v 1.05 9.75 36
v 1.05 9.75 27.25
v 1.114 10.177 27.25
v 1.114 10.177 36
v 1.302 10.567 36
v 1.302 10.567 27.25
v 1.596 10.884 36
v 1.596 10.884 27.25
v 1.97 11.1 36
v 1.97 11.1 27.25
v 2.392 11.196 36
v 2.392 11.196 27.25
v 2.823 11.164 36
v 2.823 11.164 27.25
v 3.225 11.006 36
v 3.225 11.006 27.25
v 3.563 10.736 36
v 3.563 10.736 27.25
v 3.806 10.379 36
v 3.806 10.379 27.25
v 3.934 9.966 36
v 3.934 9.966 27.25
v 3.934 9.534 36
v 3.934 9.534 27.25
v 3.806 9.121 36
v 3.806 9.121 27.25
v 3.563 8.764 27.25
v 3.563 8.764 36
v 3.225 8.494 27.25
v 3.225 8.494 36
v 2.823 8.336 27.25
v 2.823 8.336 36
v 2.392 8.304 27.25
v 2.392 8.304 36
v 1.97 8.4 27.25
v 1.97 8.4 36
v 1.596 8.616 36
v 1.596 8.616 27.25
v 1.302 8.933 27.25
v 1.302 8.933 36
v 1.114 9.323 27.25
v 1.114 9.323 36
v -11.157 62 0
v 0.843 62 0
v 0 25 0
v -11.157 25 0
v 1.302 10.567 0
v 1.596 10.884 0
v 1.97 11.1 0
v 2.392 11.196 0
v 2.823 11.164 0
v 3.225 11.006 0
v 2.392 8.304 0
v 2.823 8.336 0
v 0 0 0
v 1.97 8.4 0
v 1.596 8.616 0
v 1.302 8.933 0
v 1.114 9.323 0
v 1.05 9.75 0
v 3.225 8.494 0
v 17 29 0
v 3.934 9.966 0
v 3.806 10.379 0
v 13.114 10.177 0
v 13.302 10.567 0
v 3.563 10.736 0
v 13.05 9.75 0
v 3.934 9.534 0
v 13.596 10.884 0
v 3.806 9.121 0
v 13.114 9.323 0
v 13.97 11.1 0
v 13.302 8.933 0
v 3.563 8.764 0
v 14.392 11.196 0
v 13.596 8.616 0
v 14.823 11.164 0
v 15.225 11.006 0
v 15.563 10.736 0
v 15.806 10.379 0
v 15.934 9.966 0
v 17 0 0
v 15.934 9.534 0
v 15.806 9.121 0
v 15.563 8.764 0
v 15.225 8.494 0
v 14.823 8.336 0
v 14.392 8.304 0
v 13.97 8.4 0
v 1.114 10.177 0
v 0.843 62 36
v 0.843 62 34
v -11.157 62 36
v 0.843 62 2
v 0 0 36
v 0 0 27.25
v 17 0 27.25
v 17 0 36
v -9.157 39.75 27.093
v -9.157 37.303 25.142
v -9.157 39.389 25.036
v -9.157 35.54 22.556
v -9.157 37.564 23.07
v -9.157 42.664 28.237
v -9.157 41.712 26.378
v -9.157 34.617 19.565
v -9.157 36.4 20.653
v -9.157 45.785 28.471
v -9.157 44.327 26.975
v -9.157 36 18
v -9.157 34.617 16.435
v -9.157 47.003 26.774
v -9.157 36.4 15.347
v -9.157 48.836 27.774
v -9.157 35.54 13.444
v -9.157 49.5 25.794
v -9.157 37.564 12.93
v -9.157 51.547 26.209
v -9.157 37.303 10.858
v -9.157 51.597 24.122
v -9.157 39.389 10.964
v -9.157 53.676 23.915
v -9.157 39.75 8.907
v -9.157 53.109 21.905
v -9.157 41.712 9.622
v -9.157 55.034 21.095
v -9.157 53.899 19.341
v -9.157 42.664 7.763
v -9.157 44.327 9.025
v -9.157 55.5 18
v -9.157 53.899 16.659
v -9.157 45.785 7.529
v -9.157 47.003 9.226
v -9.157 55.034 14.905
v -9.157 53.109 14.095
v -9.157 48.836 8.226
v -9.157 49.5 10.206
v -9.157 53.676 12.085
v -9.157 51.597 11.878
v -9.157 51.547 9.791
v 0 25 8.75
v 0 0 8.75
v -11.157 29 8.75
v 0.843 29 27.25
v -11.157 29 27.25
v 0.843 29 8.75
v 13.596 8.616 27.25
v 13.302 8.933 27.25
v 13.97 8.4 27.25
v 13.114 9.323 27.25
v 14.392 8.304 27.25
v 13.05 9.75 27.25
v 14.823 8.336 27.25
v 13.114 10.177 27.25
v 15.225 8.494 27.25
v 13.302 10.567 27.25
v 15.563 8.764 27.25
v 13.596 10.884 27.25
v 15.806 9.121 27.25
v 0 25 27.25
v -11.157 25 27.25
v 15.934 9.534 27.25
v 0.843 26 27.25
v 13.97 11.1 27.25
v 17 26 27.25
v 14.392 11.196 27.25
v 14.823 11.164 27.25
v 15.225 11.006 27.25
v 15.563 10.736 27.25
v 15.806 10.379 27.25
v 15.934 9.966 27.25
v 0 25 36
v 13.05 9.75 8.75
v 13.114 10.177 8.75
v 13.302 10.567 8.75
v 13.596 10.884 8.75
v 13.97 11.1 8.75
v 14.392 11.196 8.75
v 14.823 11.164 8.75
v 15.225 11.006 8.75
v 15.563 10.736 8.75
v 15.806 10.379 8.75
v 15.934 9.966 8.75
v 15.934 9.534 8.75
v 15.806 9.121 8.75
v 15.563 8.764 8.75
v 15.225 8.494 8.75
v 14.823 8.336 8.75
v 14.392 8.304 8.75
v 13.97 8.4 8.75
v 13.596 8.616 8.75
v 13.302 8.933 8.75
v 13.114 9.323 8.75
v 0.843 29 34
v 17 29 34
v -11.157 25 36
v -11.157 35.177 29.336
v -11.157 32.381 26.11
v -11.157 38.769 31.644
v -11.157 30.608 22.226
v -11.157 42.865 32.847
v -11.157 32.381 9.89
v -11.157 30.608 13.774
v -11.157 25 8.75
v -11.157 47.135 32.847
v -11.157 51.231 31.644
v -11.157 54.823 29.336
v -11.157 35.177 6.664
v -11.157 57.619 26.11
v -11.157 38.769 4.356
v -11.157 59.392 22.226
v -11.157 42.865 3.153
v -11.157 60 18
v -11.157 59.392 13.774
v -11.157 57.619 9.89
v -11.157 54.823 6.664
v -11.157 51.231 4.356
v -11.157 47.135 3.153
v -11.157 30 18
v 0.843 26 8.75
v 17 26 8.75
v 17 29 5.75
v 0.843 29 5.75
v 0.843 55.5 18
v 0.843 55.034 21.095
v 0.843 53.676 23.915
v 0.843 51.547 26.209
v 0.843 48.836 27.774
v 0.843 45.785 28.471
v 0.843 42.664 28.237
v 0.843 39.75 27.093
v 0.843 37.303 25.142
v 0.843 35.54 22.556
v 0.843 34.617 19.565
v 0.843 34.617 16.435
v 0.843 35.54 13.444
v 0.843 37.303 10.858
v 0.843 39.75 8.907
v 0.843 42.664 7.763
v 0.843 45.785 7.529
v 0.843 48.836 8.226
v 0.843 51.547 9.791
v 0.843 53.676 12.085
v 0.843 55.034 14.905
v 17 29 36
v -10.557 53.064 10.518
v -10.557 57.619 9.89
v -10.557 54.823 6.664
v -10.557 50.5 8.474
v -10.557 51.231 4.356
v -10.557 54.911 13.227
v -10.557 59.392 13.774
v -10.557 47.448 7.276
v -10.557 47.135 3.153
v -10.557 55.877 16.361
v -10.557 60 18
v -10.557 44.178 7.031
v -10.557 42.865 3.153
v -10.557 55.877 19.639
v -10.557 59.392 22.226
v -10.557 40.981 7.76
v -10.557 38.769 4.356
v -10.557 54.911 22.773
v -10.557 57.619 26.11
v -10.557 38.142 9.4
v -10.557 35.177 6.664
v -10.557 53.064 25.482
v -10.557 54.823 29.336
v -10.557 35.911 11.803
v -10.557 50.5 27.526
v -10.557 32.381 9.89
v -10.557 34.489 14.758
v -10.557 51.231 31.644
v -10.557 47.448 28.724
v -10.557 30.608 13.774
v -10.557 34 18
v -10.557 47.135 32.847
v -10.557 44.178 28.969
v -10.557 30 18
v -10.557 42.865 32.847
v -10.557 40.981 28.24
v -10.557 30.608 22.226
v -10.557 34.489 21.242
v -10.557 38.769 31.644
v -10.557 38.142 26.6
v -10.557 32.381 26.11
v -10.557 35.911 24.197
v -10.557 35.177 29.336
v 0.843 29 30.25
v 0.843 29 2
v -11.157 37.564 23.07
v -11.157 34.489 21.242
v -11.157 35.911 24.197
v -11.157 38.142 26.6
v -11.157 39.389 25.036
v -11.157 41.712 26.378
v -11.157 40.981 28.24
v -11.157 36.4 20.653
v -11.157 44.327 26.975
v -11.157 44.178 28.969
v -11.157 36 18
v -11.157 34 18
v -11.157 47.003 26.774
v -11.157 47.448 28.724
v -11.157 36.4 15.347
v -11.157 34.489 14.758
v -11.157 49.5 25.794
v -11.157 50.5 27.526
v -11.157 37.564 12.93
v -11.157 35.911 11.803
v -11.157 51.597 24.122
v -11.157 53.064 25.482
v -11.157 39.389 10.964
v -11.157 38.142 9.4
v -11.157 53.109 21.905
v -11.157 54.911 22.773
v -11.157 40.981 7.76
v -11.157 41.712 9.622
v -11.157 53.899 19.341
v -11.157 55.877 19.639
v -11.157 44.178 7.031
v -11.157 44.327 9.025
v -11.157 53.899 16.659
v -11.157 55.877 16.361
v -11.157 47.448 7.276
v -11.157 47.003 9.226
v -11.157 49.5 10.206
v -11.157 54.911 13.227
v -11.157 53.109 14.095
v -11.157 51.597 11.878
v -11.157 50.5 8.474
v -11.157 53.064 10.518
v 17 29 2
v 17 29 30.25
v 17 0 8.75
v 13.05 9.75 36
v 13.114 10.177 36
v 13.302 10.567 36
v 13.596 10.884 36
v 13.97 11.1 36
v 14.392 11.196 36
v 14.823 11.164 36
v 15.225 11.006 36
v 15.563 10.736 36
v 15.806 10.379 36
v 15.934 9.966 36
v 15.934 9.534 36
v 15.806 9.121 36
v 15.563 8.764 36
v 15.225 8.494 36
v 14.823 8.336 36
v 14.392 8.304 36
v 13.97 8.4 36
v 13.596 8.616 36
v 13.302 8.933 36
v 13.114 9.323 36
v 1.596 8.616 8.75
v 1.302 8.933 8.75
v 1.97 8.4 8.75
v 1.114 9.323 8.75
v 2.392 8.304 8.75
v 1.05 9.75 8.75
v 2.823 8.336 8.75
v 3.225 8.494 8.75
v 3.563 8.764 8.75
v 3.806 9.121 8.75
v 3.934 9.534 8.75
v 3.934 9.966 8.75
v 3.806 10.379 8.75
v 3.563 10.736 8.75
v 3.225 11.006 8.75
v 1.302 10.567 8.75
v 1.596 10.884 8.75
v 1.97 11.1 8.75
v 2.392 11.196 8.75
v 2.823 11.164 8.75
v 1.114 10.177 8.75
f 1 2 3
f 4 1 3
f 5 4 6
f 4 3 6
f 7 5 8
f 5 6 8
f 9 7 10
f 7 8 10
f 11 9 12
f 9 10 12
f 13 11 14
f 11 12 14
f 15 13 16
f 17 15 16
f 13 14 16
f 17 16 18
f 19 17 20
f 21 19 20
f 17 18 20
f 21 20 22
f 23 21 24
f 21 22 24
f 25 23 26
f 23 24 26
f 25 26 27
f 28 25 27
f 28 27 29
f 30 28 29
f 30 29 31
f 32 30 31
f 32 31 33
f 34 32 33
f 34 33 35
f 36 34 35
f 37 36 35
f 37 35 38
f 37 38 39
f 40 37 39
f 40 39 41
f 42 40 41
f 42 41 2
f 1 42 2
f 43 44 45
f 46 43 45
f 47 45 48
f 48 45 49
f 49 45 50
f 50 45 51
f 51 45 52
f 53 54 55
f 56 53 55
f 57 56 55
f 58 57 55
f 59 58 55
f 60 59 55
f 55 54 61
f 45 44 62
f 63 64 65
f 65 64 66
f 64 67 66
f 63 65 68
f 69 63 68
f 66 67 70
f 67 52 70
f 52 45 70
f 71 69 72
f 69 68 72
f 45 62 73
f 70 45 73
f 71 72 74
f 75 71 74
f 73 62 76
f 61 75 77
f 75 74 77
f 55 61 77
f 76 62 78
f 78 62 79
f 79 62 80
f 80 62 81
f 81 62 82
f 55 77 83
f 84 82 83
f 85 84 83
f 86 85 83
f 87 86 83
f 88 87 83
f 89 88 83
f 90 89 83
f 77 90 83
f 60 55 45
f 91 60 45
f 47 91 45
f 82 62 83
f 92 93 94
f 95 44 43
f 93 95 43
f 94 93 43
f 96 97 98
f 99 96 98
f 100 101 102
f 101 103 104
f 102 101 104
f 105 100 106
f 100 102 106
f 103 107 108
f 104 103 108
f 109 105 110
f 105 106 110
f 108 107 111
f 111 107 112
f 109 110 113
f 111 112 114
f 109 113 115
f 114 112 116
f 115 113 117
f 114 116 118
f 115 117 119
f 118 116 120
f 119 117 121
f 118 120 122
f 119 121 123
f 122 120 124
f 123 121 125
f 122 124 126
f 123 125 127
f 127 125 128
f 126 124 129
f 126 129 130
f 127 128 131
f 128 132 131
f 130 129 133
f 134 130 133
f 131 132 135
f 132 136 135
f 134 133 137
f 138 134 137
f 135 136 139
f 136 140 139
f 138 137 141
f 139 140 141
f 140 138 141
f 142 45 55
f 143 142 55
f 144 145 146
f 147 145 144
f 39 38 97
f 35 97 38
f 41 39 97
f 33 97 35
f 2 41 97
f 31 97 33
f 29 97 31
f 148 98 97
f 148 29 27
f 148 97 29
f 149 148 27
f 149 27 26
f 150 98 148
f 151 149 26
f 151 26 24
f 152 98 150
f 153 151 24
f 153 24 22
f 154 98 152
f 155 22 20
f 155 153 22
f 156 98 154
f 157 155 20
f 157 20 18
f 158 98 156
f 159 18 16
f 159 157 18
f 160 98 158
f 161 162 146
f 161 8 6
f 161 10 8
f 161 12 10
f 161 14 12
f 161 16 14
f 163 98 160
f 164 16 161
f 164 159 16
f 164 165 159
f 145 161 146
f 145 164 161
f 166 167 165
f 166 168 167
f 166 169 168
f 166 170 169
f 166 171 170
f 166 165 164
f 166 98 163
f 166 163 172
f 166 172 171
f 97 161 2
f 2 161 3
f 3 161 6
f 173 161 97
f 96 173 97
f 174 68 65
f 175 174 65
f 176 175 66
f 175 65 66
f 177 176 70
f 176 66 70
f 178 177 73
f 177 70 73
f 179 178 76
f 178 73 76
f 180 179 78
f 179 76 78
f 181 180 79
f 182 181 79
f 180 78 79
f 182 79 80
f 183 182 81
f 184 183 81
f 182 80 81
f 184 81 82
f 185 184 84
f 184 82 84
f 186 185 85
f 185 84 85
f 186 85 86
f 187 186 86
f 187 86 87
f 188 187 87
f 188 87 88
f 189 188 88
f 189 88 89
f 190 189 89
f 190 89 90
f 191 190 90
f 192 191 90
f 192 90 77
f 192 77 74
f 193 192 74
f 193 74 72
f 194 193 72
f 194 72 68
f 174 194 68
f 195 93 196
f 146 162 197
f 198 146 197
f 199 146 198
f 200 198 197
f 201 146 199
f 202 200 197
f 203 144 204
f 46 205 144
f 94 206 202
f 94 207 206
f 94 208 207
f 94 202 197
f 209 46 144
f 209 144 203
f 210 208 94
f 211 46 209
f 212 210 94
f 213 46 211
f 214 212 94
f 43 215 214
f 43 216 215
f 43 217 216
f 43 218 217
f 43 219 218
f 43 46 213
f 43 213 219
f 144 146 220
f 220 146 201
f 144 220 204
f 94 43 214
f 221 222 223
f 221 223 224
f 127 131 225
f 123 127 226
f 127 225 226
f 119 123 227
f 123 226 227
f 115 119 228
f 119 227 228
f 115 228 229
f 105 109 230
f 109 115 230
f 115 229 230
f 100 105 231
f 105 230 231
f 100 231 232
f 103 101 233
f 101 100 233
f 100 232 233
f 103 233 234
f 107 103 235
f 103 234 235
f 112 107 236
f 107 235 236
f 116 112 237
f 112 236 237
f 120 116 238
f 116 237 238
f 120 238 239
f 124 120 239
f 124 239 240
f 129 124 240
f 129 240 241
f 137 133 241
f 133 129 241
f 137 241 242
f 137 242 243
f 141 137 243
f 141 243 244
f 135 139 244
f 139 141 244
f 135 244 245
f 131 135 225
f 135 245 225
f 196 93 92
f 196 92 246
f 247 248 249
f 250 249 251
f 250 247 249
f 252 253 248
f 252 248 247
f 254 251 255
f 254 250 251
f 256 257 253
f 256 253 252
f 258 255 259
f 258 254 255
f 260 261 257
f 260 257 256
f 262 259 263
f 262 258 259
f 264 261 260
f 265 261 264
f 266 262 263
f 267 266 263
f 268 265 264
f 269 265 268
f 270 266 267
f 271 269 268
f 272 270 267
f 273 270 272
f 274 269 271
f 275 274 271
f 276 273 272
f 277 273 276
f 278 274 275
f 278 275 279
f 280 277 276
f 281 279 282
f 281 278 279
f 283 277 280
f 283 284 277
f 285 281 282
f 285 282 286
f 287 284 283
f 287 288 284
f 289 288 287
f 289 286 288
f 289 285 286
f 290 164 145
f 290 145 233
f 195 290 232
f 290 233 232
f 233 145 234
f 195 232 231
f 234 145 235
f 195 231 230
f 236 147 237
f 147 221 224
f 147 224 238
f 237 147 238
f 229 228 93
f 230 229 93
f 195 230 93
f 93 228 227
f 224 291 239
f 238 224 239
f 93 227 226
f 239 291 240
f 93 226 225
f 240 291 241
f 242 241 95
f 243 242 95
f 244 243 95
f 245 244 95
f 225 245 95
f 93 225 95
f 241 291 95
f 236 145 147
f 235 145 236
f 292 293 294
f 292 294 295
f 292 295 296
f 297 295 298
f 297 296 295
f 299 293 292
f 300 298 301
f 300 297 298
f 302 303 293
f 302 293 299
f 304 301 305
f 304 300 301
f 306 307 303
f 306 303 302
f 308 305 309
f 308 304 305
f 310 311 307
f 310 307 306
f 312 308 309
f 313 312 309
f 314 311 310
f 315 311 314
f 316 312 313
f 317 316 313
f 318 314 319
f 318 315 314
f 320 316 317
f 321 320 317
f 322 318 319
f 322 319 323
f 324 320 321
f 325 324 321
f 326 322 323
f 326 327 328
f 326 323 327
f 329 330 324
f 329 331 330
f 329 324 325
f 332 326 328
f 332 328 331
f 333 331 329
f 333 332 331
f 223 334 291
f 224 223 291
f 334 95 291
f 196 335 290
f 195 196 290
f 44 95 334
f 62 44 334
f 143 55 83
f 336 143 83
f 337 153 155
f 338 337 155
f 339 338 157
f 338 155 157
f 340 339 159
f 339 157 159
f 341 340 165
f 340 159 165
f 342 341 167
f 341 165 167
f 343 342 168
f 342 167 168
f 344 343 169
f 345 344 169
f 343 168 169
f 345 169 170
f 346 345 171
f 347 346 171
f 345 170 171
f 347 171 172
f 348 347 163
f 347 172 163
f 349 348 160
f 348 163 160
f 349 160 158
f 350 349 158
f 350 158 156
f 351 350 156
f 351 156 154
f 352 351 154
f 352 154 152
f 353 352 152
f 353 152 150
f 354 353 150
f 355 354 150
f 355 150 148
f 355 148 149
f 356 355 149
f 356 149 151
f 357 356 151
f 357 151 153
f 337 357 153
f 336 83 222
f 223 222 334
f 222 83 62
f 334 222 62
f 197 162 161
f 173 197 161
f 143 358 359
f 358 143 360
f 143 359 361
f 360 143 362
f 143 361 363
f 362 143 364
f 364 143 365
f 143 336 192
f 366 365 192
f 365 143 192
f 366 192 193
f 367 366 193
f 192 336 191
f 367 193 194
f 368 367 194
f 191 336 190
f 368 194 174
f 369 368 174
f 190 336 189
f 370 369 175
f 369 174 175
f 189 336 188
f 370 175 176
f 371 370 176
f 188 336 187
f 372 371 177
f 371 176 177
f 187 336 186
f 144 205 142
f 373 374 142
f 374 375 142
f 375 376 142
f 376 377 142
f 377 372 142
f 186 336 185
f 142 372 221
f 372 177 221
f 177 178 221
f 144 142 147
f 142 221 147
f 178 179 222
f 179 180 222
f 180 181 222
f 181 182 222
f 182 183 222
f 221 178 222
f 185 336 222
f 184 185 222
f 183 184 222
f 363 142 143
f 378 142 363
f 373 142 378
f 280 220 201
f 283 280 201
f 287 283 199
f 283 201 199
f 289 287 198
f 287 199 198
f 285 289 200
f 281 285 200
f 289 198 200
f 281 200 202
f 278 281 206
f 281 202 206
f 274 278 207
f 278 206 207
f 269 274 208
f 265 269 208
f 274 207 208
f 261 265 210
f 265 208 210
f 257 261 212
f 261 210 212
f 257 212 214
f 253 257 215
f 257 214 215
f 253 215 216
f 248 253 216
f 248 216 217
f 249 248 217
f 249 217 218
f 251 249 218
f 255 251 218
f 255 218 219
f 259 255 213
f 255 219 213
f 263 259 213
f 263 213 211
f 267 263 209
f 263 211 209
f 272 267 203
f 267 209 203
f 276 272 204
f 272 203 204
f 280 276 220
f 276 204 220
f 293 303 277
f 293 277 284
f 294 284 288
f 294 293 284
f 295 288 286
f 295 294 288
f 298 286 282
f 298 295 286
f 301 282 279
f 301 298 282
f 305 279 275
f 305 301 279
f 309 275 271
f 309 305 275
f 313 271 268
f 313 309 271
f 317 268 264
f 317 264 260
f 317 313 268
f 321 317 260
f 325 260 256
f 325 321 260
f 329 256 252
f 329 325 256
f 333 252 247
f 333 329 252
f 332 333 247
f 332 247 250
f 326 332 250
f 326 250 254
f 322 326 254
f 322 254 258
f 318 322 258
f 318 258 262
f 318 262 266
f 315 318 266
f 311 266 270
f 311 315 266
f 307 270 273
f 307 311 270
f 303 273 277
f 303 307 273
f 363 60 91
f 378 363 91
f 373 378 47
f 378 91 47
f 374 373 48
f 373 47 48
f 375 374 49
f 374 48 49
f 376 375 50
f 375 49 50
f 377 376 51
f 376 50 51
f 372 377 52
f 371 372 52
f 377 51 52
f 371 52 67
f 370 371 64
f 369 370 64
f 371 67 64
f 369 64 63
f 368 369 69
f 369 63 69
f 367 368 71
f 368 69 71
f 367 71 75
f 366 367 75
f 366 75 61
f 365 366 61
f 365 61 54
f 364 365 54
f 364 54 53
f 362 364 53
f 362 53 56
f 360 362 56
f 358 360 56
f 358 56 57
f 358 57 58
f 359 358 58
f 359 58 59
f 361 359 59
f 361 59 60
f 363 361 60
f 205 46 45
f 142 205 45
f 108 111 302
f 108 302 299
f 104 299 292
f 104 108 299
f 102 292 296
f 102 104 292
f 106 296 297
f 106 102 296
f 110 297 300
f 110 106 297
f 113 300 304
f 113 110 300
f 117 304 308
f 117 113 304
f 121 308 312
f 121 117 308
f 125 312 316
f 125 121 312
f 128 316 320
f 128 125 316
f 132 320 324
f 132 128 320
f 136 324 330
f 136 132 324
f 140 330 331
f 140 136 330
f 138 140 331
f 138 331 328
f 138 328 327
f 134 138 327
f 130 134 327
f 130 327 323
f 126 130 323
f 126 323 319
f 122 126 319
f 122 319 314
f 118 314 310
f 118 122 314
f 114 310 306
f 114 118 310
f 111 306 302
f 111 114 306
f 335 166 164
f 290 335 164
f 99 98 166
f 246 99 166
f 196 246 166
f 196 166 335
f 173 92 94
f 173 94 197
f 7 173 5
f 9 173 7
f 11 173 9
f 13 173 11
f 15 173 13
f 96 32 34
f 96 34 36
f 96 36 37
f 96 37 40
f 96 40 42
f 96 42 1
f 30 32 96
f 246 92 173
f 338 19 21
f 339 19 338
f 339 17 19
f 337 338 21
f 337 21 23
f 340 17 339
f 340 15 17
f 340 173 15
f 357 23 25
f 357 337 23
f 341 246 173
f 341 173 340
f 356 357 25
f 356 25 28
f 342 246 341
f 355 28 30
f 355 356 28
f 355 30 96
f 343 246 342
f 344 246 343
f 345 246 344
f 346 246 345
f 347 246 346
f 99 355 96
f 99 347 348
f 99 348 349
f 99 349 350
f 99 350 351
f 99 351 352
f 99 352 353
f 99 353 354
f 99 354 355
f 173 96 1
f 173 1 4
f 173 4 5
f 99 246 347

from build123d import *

# Parameters (mm, degrees)
BOSS_EXTRUDE1_DEPTH    = 36
SKETCH2_R              = 10.5
CUT_EXTRUDE1_DEPTH     = 74.491730036
SKETCH3_W              = 18.5
SKETCH3_H              = 29
CUT_EXTRUDE2_DEPTH     = 78.024618067
RIB1_REACH             = 75.682
SKETCH4_WALL_W         = 186.1063102
SKETCH4_WALL_H         = 2
RIB2_REACH             = 75.682
SKETCH5_WALL_W         = 186.1063102
SKETCH5_WALL_H         = 2
CHAMFER1_SIZE          = 3
BOSS_EXTRUDE2_START    = -2
SKETCH6_R              = 10.5
SKETCH6_R_2            = 9
BOSS_EXTRUDE2_DEPTH    = 2
M2_5_CLEARANCE_HOLE1_D = 2.9
SKETCH10_R             = 15
SKETCH10_R_2           = 11
CUT_EXTRUDE4_DEPTH     = 0.6


with BuildPart() as part:
    # Sketch1 → Boss-Extrude1 (new body)
    with BuildSketch(Plane.XY):
        Polygon((0, 0), (17, 0), (17, 29), (0.843441467, 29), (0.843441467, 62), (-11.156558533, 62), (-11.156558533, 25), (0, 25), align=None)
    extrude(amount=BOSS_EXTRUDE1_DEPTH)

    # Sketch2 → Cut-Extrude1 (cut, through all)
    with BuildSketch(Plane(origin=(0.843441467, 0, 0), x_dir=(0, 0, -1), z_dir=(1, 0, 0))):
        with Locations(Location((-18, 45, 0), (0, 0, 90))):
            Circle(SKETCH2_R)
    extrude(amount=-CUT_EXTRUDE1_DEPTH, mode=Mode.SUBTRACT)

    # Sketch3 → Cut-Extrude2 (cut, through all)
    with BuildSketch(Plane(origin=(17, 0, 0), x_dir=(0, 0, -1), z_dir=(1, 0, 0))):
        with Locations((-18, 14.5)):
            Rectangle(SKETCH3_W, SKETCH3_H)
    extrude(amount=-CUT_EXTRUDE2_DEPTH, mode=Mode.SUBTRACT)

    # Sketch4 wall → Rib1 (add, up to next)
    with BuildSketch(Plane(origin=(8.921720734, 45.5, 36), x_dir=(0.439720227065, -0.898134801636, 0), z_dir=(0.898134801636, 0.439720227065, 0)), mode=Mode.PRIVATE) as rib1_sk1:
        with Locations((0, 1)):
            Rectangle(SKETCH4_WALL_W, SKETCH4_WALL_H)
    rib1_tool1 = extrude(rib1_sk1.sketch, amount=-RIB1_REACH, mode=Mode.PRIVATE) - part.part
    add(rib1_tool1.solids().sort_by_distance((8.921720734, 45.5, 36))[0])

    # Sketch5 wall → Rib2 (add, up to next)
    with BuildSketch(Plane(origin=(8.921720734, 45.5, 0), x_dir=(0.439720227065, -0.898134801636, 0), z_dir=(-0.898134801636, -0.439720227065, 0)), mode=Mode.PRIVATE) as rib2_sk1:
        with Locations((0, 1)):
            Rectangle(SKETCH5_WALL_W, SKETCH5_WALL_H)
    rib2_tool1 = extrude(rib2_sk1.sketch, amount=RIB2_REACH, mode=Mode.PRIVATE) - part.part
    add(rib2_tool1.solids().sort_by_distance((8.921720734, 45.5, 0))[0])

    # Chamfer1
    chamfer1_edges = [part.edges().sort_by_distance(p)[0] for p in [
        (8.921720733, 29, 8.75),
        (8.921720733, 29, 27.25),
    ]]
    chamfer(chamfer1_edges, length=CHAMFER1_SIZE)

    # Sketch6 → Boss-Extrude2 (add)
    with BuildSketch(Plane.ZY.offset(11.156558533).offset(BOSS_EXTRUDE2_START)):
        with Locations(Location((18, 45, 0), (0, 0, 90))):
            Circle(SKETCH6_R)
        with Locations(Location((18, 45, 0), (0, 0, 270))):
            Circle(SKETCH6_R_2, mode=Mode.SUBTRACT)
    extrude(amount=BOSS_EXTRUDE2_DEPTH)

    # M2.5 Clearance Hole1 (through all)
    with Locations(Plane.XY.offset(36)):
        with Locations((2.5, 9.75), (14.5, 9.75)):
            Hole(M2_5_CLEARANCE_HOLE1_D / 2)

    # Sketch10 → Cut-Extrude4 (cut)
    with BuildSketch(Plane.ZY.offset(11.156558533)):
        with Locations(Location((18, 45, 0), (0, 0, 270))):
            Circle(SKETCH10_R)
        with Locations(Location((18, 45, 0), (0, 0, 270))):
            Circle(SKETCH10_R_2, mode=Mode.SUBTRACT)
    extrude(amount=-CUT_EXTRUDE4_DEPTH, mode=Mode.SUBTRACT)


solid = part.part
